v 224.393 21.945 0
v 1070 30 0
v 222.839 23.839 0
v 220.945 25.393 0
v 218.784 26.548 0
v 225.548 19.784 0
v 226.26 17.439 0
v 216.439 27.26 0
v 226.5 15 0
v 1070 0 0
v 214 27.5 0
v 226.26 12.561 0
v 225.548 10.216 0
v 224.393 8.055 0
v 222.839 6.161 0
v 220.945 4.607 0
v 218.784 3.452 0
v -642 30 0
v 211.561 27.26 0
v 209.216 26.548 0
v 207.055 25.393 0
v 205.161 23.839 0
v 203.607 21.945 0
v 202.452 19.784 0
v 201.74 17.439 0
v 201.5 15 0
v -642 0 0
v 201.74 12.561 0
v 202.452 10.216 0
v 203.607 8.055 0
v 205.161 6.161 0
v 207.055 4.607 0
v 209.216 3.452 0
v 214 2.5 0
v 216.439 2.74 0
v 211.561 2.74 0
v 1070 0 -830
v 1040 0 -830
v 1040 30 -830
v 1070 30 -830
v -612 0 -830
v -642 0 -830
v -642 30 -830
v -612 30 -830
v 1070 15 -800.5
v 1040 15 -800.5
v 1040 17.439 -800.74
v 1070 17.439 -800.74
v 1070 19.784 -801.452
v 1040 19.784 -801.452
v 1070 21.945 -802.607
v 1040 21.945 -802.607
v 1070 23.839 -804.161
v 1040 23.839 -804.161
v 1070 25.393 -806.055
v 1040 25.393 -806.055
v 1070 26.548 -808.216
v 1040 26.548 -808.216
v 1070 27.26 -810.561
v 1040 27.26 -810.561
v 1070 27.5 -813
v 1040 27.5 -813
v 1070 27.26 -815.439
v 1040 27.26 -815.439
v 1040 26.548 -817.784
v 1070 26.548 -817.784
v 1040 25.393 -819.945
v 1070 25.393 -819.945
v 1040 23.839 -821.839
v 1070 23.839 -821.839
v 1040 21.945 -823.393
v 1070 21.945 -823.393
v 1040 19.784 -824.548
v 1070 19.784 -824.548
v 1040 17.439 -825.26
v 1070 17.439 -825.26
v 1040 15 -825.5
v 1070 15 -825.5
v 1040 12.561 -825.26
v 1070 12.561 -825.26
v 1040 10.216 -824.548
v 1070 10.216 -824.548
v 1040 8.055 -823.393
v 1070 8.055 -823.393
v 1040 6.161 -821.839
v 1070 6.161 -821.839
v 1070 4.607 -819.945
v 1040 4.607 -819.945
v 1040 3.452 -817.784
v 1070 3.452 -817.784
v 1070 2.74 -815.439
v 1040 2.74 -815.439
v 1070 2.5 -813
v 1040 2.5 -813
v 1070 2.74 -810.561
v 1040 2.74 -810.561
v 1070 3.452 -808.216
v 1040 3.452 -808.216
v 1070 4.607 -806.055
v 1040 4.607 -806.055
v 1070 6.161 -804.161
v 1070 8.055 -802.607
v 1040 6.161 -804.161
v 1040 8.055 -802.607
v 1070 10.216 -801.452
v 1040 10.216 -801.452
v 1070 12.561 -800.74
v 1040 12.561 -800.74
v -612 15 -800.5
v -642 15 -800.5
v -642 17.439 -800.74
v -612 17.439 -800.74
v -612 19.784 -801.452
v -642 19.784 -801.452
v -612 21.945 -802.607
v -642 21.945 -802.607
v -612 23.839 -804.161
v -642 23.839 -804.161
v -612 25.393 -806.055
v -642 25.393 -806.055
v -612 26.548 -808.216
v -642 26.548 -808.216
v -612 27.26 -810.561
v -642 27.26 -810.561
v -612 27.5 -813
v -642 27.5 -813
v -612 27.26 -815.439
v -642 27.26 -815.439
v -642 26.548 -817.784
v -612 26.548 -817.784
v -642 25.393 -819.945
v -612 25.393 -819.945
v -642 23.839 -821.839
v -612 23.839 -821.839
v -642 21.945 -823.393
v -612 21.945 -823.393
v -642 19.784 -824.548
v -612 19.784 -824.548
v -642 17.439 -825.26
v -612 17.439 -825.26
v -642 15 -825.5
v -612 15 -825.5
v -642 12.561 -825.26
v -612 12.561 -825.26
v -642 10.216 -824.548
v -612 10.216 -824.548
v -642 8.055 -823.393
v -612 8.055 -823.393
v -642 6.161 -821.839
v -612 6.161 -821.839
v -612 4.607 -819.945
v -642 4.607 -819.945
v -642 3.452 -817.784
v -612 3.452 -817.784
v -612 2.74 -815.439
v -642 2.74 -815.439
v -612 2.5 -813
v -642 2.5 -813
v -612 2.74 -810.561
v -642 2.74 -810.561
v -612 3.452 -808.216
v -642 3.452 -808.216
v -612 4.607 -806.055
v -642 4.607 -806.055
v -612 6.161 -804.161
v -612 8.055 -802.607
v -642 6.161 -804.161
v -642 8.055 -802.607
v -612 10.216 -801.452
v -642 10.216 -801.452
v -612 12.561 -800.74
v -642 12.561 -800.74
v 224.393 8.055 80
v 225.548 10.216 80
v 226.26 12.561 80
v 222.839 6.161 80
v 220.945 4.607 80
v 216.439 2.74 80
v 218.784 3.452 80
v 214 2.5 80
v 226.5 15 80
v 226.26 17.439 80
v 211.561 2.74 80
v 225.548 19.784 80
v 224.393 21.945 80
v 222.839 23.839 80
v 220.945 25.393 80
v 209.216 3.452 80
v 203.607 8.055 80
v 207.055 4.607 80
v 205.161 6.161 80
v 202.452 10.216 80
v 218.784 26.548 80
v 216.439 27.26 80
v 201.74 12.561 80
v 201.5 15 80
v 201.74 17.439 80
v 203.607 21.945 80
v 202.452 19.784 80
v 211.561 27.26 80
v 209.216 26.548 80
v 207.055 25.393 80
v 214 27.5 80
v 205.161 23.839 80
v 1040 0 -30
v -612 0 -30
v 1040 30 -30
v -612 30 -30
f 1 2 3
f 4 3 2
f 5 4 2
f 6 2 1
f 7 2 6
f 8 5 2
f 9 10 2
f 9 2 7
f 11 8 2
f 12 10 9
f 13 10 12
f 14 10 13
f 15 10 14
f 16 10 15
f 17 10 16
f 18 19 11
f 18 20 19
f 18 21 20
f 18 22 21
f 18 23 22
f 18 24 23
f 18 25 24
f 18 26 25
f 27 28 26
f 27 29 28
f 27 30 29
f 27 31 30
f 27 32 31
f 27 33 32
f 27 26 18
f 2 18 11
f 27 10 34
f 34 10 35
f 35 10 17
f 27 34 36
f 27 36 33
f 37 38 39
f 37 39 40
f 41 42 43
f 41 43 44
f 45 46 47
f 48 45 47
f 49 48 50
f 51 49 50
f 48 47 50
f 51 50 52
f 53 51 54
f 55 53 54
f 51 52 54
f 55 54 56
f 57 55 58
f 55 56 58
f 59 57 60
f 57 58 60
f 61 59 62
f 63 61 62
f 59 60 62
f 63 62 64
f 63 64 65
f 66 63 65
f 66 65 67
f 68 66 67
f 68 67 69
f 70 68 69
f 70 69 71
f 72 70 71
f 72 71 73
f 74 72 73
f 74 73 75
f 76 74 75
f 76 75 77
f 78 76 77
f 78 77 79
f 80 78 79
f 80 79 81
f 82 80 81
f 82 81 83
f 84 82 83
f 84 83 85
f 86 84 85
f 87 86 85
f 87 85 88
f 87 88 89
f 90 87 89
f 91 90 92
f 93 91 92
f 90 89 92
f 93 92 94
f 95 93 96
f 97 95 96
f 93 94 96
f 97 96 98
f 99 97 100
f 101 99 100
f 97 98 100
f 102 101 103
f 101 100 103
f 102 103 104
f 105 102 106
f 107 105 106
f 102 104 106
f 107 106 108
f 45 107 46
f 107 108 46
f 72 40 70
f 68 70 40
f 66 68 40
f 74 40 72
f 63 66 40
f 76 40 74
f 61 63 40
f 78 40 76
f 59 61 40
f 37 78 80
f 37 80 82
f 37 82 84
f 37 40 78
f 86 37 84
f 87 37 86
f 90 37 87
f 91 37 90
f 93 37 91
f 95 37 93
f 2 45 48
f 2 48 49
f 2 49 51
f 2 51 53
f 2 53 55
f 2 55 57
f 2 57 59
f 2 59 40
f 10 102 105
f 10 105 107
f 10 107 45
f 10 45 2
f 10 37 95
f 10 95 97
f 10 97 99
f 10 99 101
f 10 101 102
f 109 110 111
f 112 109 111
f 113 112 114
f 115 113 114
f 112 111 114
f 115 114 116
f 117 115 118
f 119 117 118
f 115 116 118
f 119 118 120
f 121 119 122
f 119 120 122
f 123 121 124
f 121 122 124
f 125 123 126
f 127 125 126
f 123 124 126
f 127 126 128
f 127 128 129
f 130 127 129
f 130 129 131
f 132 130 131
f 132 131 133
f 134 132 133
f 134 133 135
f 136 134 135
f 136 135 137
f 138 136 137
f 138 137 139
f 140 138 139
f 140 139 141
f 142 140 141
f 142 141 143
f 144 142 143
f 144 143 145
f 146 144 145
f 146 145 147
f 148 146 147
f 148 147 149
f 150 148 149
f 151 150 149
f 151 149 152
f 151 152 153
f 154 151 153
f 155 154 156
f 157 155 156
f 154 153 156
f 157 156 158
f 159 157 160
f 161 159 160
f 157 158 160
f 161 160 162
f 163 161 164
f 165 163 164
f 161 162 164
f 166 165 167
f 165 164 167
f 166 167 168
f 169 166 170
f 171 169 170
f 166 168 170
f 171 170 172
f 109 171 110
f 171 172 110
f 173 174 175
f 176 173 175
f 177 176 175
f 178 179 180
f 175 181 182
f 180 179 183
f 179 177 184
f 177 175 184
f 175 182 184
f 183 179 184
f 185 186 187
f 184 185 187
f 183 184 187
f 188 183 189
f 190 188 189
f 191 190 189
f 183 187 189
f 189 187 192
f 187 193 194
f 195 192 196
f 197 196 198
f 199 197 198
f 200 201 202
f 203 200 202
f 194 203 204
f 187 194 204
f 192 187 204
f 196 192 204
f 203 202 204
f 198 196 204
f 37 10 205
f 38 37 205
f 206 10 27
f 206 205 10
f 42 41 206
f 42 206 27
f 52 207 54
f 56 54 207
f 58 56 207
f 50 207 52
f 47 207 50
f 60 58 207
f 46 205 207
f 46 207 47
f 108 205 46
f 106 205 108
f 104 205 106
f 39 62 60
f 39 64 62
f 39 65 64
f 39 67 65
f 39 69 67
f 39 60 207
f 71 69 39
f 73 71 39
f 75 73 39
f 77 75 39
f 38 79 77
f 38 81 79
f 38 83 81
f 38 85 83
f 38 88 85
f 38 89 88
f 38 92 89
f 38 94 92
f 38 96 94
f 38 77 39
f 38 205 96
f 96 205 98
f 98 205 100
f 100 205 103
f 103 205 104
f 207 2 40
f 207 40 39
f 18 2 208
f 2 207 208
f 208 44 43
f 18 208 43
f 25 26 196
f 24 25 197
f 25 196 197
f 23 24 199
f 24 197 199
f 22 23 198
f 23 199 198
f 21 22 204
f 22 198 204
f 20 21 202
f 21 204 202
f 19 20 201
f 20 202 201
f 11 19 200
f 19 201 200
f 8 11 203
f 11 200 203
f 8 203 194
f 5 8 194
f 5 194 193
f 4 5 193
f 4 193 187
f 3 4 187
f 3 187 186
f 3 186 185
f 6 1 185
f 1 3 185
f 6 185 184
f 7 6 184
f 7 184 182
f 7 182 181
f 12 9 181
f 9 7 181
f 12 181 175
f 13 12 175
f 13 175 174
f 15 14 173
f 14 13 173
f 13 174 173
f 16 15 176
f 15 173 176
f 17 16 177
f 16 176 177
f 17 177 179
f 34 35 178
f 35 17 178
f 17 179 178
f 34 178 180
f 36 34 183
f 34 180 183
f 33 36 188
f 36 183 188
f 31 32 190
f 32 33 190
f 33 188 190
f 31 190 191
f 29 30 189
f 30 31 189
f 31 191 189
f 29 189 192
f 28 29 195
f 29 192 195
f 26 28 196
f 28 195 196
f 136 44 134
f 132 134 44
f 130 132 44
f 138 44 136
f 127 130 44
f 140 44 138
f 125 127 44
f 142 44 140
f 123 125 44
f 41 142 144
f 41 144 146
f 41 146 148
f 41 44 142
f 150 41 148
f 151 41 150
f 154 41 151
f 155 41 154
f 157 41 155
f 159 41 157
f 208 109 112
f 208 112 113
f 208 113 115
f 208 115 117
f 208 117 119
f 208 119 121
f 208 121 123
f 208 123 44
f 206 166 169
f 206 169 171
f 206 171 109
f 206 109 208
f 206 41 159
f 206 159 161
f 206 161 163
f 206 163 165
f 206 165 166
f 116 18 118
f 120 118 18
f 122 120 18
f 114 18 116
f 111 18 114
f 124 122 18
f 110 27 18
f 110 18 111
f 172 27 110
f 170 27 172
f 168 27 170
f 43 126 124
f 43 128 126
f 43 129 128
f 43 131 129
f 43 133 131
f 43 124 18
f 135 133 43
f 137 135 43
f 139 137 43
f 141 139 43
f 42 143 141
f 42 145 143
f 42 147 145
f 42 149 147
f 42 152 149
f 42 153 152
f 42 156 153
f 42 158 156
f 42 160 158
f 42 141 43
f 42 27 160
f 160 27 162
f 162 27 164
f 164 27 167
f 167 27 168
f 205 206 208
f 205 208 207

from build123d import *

# Parameters (mm, degrees)
EXTRUDE_1_DEPTH     = 30
SKETCH_3_R          = 12.5
CUT_EXTRUDE_1_DEPTH = 1903.825267858
SKETCH_5_R          = 12.5
CUT_EXTRUDE_2_DEPTH = 1355.510981868
EXTRUDE_START       = -110
SKETCH_7_R          = 12.5
EXTRUDE_3_DEPTH     = 110


with BuildPart() as part:
    # Эскиз1 → Бобышка-Вытянуть1 (new body)
    with BuildSketch(Plane(origin=(0, 0, 0), x_dir=(1, 0, 0), z_dir=(0, 1, 0))):
        Polygon((1070, 0), (-642, 0), (-642, 830), (-612, 830), (-612, 30), (1040, 30), (1040, 830), (1070, 830), align=None)
    extrude(amount=EXTRUDE_1_DEPTH)

    # Эскиз3 → Вырез-Вытянуть1 (cut, through all)
    with BuildSketch(Plane.ZY.offset(642)):
        with Locations((-813, 15)):
            Circle(SKETCH_3_R)
    extrude(amount=-CUT_EXTRUDE_1_DEPTH, mode=Mode.SUBTRACT)

    # Эскиз5 → Вырез-Вытянуть2 (cut, through all)
    with BuildSketch(Plane.XY):
        with Locations((214, 15)):
            Circle(SKETCH_5_R)
    extrude(amount=-CUT_EXTRUDE_2_DEPTH, mode=Mode.SUBTRACT)

    # Эскиз7 → Бобышка-Вытянуть3 (add)
    with BuildSketch(Plane(origin=(0, 0, -30), x_dir=(-1, 0, 0), z_dir=(0, 0, -1)).offset(EXTRUDE_START)):
        with Locations((-214, 15)):
            Circle(SKETCH_7_R)
    extrude(amount=EXTRUDE_3_DEPTH)


solid = part.part
